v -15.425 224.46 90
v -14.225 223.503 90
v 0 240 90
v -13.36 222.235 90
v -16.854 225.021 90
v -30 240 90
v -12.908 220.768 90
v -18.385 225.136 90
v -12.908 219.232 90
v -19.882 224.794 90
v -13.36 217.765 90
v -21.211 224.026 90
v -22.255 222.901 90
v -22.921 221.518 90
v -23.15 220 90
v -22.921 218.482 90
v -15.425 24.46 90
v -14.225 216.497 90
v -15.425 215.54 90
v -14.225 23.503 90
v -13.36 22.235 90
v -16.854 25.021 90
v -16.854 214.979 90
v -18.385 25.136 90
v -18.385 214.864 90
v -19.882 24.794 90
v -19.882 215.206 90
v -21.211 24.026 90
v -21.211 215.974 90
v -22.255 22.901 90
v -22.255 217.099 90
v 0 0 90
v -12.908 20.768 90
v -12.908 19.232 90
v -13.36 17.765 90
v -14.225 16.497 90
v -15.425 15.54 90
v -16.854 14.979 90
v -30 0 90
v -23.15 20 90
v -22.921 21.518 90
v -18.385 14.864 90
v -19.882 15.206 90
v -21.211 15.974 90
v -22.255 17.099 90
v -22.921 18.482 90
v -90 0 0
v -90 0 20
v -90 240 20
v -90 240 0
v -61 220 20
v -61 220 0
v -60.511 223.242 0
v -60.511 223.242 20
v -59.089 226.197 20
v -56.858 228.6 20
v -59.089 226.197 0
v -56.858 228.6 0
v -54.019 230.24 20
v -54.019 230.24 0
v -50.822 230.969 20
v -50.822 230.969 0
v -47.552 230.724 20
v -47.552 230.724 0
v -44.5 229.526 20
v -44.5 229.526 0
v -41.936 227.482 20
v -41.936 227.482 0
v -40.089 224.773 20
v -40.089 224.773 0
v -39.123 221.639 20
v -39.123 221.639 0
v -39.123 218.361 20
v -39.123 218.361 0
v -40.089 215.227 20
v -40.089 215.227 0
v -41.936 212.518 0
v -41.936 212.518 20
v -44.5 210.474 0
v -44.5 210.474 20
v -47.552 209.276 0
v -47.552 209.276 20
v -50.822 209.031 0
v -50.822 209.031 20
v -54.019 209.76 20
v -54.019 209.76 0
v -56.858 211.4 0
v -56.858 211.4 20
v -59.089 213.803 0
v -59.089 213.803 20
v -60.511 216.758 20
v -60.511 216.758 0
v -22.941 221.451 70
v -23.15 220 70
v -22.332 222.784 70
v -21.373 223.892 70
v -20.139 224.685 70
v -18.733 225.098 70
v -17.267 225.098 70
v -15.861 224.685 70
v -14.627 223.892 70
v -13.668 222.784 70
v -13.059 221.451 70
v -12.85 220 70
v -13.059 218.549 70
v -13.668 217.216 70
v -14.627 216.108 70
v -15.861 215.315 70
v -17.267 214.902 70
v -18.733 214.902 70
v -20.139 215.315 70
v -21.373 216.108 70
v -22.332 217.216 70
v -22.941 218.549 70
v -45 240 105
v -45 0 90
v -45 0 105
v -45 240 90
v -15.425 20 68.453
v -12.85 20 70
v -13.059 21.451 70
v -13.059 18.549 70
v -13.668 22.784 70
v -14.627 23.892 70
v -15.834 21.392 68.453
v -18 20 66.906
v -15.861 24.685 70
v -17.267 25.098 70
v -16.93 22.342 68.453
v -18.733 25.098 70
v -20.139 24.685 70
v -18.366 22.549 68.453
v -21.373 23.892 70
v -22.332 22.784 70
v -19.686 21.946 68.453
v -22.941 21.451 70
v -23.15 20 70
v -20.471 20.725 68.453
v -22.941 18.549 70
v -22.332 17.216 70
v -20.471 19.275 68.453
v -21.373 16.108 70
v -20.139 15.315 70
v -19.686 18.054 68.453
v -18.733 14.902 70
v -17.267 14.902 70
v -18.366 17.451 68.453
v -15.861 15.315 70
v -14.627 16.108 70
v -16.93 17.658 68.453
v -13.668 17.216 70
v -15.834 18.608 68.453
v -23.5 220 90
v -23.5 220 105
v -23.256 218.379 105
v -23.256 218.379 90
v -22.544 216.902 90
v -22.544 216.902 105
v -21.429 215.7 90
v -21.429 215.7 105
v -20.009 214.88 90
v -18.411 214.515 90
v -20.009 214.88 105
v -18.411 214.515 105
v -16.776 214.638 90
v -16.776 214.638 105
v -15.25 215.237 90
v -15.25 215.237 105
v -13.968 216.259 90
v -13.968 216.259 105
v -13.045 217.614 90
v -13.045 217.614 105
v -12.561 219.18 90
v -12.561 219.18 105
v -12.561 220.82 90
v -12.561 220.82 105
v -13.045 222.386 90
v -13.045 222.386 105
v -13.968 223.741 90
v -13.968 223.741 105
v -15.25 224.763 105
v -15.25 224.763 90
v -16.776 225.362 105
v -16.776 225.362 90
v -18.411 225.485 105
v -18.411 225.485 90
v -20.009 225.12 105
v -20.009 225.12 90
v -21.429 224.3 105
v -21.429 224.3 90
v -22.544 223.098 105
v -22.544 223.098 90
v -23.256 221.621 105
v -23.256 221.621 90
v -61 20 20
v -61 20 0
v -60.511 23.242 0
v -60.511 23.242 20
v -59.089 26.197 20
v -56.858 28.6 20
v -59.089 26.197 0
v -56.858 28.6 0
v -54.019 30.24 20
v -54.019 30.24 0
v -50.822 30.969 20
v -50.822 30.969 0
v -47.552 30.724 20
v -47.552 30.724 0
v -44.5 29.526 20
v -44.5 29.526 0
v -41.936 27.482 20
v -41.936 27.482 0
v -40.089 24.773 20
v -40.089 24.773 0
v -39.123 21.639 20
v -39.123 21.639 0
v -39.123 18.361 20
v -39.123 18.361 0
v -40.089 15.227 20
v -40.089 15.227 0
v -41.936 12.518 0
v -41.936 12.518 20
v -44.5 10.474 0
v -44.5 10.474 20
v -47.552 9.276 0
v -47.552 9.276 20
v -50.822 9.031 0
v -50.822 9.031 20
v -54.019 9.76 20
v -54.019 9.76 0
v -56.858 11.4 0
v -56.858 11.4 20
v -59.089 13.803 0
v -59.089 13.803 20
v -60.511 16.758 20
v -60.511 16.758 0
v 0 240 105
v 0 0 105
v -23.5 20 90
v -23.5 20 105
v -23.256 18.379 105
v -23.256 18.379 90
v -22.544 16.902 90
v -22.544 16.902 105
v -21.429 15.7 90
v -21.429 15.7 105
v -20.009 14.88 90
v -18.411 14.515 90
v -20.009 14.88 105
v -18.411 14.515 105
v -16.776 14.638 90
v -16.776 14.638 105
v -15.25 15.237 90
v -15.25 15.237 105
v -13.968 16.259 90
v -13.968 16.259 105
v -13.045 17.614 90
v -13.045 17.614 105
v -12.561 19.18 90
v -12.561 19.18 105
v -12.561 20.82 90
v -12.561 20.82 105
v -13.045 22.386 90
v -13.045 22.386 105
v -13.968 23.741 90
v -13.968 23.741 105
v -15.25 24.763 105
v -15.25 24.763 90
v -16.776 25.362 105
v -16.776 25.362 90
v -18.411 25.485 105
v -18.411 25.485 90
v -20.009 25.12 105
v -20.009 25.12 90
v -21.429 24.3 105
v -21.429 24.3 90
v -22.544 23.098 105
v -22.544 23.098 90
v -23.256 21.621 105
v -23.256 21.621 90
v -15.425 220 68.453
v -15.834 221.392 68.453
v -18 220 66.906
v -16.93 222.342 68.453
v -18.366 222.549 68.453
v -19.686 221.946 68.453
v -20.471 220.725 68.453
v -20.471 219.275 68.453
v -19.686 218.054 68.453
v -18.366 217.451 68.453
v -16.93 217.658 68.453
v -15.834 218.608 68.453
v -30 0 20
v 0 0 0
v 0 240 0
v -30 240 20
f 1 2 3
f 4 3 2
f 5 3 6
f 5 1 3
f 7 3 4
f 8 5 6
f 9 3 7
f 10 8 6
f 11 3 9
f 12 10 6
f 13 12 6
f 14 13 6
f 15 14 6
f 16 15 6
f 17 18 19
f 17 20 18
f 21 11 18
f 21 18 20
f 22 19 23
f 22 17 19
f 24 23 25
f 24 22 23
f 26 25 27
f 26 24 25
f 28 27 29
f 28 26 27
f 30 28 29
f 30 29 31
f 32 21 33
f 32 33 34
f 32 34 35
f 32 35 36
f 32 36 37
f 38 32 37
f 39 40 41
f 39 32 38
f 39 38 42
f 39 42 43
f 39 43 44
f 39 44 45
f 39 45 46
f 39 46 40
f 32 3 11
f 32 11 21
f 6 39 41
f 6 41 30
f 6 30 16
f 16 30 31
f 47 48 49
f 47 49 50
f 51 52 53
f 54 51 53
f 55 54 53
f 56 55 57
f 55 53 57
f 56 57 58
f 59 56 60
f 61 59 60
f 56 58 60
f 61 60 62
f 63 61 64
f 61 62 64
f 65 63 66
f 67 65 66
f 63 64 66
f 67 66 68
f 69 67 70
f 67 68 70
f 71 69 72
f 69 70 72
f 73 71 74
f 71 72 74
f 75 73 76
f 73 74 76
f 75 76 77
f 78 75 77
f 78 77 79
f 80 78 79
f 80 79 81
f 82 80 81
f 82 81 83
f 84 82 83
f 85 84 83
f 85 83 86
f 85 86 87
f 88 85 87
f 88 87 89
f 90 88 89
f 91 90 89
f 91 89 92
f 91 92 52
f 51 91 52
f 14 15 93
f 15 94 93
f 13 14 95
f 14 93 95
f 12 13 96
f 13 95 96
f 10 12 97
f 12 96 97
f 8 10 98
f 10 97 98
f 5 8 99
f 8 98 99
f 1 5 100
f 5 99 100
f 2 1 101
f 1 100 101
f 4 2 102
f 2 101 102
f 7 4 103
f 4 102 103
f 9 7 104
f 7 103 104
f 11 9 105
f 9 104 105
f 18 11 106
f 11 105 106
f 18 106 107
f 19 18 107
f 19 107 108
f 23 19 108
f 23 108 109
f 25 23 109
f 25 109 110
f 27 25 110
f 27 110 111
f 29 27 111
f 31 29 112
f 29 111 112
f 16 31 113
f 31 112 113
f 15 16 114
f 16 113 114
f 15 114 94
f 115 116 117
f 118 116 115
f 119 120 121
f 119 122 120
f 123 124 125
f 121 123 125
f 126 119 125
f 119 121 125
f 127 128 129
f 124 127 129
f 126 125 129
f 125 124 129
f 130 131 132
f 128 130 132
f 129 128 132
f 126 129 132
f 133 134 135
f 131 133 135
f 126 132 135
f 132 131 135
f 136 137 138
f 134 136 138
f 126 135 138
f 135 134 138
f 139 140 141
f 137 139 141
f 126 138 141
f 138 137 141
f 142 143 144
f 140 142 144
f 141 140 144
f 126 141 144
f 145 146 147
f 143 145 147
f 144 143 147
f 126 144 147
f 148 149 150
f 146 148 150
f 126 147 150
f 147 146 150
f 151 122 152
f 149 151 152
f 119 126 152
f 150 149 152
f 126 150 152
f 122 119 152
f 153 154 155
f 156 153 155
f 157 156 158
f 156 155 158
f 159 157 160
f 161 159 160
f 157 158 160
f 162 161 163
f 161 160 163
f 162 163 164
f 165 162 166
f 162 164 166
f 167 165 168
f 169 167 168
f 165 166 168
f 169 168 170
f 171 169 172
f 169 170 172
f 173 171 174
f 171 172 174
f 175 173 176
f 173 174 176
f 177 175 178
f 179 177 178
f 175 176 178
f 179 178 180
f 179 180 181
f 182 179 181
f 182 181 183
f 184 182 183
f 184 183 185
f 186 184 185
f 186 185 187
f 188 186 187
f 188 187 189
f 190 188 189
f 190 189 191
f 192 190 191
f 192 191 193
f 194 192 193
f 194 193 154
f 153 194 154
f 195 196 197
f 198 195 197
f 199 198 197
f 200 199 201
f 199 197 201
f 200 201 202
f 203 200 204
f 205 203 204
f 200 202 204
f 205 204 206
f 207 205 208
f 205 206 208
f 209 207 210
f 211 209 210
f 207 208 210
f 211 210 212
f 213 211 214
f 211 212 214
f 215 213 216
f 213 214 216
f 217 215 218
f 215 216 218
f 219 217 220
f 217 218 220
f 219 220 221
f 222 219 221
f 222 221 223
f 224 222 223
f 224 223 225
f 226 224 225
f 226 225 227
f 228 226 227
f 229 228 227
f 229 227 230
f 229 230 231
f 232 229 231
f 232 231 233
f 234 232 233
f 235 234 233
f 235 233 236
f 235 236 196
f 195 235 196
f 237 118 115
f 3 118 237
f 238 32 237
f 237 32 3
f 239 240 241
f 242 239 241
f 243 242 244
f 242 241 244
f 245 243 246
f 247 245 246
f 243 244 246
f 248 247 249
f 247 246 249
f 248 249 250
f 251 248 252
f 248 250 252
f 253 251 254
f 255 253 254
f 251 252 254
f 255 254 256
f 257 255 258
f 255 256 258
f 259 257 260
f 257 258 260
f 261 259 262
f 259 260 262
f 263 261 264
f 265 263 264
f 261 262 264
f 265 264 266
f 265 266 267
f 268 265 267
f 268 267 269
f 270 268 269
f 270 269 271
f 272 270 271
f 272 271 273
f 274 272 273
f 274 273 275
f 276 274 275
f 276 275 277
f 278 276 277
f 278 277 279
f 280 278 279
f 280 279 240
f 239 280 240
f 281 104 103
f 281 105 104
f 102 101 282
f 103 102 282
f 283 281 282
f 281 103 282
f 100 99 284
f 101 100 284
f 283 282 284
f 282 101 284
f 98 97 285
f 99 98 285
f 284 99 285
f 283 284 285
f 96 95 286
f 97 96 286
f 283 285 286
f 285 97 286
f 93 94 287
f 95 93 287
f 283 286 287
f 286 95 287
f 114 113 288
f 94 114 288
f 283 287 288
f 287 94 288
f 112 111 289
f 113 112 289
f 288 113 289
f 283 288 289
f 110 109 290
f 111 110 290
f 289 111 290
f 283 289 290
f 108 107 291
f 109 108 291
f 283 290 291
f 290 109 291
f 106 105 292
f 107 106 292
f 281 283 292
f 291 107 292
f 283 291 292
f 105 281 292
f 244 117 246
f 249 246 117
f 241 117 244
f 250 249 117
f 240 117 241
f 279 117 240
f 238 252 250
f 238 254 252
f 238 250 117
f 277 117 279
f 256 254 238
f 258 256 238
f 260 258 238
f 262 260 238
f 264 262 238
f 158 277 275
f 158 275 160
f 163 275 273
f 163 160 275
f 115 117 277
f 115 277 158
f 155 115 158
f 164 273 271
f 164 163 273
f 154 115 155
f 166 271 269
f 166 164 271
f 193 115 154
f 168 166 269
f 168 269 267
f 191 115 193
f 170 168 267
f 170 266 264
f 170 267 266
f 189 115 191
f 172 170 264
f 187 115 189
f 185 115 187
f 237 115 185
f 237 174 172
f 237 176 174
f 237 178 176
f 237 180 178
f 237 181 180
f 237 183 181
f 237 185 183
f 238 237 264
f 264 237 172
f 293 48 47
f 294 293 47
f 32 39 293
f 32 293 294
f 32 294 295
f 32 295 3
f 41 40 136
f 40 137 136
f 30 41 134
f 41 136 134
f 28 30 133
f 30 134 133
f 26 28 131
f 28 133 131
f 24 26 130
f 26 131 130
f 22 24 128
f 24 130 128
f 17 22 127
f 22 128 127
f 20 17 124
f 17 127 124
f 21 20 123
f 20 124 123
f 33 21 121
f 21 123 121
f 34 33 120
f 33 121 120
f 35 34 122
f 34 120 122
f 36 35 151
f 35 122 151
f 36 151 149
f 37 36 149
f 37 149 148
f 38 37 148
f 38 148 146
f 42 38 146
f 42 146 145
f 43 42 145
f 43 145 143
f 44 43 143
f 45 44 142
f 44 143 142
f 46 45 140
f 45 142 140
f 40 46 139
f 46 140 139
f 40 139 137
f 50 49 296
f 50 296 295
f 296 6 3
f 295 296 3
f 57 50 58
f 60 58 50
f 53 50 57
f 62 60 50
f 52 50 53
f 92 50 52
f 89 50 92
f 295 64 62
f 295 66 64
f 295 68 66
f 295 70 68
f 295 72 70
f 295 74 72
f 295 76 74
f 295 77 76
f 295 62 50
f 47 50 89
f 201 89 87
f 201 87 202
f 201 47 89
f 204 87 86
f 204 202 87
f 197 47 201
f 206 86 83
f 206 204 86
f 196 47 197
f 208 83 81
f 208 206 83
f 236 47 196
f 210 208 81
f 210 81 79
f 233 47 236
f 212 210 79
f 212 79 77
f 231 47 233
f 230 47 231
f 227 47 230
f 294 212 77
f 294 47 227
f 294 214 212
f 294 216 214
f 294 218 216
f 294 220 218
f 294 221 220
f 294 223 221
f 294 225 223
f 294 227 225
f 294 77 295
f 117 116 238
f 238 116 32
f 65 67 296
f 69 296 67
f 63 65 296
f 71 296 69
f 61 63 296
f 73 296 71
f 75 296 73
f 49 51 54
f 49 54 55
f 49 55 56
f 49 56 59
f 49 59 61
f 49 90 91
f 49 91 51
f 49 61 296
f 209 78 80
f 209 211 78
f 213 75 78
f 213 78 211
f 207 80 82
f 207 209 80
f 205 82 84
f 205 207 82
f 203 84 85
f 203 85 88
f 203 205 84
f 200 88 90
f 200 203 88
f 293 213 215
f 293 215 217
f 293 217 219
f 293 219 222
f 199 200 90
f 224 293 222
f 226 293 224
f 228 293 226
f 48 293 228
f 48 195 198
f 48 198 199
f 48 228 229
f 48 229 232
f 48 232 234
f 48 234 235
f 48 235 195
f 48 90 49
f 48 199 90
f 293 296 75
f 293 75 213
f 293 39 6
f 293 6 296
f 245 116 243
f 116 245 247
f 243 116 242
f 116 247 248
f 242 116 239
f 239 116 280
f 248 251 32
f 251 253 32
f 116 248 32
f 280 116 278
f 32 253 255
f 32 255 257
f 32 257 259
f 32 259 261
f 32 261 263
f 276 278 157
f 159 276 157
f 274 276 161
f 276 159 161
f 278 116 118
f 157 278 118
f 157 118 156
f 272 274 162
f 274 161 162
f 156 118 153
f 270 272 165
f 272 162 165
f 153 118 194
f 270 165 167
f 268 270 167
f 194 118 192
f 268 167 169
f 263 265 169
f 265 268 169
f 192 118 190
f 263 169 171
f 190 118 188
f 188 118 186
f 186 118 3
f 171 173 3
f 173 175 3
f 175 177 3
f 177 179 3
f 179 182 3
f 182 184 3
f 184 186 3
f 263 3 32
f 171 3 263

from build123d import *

# Parameters (mm, degrees)
F1_DEPTH = 240
F3_D     = 22
F5_D     = 10.3
F5_DEPTH = 20
F5_TIP   = 3.094432188
F6_W     = 45
F6_H     = 240
F7_DEPTH = 15
F8_D     = 11


# Not quite as in the source:
# - a feature names something its author has since deleted; it is built from what else it names


with BuildPart() as f1:
    # F0 (on Front) → F1 (new body)
    with BuildSketch(Plane.XZ):
        Polygon((-30, 20), (-90, 20), (-90, 0), (0, 0), (0, 90), (-30, 90), align=None)
    extrude(amount=-F1_DEPTH)

    # F3 (through all)
    with Locations(Plane.XY.offset(20)):
        with Locations((-50, 220), (-50, 20), (-50, 220), (-50, 20)):
            Hole(F3_D / 2)

    # F5
    with Locations(Plane.XY.offset(90)):
        with Locations((-18, 220), (-18, 20)):
            Hole(F5_D / 2, depth=F5_DEPTH)
            with Locations((0, 0, -(F5_DEPTH + F5_TIP / 2))):  # 118° drill point
                Cone(0, F5_D / 2, F5_TIP, mode=Mode.SUBTRACT)


with BuildPart() as f7:
    # F6 (on face) → F7 (new body)
    with BuildSketch(Plane.XY.offset(90)):
        with Locations((-22.5, 120)):
            Rectangle(F6_W, F6_H)
    extrude(amount=F7_DEPTH)

    # F8 (through all)
    with Locations(Plane(origin=(0, 0, 90), x_dir=(1, 0, 0), z_dir=(0, 0, -1))):
        with Locations((-18, -220), (-18, -20)):
            Hole(F8_D / 2)


solid = Compound([f1.part, f7.part])
